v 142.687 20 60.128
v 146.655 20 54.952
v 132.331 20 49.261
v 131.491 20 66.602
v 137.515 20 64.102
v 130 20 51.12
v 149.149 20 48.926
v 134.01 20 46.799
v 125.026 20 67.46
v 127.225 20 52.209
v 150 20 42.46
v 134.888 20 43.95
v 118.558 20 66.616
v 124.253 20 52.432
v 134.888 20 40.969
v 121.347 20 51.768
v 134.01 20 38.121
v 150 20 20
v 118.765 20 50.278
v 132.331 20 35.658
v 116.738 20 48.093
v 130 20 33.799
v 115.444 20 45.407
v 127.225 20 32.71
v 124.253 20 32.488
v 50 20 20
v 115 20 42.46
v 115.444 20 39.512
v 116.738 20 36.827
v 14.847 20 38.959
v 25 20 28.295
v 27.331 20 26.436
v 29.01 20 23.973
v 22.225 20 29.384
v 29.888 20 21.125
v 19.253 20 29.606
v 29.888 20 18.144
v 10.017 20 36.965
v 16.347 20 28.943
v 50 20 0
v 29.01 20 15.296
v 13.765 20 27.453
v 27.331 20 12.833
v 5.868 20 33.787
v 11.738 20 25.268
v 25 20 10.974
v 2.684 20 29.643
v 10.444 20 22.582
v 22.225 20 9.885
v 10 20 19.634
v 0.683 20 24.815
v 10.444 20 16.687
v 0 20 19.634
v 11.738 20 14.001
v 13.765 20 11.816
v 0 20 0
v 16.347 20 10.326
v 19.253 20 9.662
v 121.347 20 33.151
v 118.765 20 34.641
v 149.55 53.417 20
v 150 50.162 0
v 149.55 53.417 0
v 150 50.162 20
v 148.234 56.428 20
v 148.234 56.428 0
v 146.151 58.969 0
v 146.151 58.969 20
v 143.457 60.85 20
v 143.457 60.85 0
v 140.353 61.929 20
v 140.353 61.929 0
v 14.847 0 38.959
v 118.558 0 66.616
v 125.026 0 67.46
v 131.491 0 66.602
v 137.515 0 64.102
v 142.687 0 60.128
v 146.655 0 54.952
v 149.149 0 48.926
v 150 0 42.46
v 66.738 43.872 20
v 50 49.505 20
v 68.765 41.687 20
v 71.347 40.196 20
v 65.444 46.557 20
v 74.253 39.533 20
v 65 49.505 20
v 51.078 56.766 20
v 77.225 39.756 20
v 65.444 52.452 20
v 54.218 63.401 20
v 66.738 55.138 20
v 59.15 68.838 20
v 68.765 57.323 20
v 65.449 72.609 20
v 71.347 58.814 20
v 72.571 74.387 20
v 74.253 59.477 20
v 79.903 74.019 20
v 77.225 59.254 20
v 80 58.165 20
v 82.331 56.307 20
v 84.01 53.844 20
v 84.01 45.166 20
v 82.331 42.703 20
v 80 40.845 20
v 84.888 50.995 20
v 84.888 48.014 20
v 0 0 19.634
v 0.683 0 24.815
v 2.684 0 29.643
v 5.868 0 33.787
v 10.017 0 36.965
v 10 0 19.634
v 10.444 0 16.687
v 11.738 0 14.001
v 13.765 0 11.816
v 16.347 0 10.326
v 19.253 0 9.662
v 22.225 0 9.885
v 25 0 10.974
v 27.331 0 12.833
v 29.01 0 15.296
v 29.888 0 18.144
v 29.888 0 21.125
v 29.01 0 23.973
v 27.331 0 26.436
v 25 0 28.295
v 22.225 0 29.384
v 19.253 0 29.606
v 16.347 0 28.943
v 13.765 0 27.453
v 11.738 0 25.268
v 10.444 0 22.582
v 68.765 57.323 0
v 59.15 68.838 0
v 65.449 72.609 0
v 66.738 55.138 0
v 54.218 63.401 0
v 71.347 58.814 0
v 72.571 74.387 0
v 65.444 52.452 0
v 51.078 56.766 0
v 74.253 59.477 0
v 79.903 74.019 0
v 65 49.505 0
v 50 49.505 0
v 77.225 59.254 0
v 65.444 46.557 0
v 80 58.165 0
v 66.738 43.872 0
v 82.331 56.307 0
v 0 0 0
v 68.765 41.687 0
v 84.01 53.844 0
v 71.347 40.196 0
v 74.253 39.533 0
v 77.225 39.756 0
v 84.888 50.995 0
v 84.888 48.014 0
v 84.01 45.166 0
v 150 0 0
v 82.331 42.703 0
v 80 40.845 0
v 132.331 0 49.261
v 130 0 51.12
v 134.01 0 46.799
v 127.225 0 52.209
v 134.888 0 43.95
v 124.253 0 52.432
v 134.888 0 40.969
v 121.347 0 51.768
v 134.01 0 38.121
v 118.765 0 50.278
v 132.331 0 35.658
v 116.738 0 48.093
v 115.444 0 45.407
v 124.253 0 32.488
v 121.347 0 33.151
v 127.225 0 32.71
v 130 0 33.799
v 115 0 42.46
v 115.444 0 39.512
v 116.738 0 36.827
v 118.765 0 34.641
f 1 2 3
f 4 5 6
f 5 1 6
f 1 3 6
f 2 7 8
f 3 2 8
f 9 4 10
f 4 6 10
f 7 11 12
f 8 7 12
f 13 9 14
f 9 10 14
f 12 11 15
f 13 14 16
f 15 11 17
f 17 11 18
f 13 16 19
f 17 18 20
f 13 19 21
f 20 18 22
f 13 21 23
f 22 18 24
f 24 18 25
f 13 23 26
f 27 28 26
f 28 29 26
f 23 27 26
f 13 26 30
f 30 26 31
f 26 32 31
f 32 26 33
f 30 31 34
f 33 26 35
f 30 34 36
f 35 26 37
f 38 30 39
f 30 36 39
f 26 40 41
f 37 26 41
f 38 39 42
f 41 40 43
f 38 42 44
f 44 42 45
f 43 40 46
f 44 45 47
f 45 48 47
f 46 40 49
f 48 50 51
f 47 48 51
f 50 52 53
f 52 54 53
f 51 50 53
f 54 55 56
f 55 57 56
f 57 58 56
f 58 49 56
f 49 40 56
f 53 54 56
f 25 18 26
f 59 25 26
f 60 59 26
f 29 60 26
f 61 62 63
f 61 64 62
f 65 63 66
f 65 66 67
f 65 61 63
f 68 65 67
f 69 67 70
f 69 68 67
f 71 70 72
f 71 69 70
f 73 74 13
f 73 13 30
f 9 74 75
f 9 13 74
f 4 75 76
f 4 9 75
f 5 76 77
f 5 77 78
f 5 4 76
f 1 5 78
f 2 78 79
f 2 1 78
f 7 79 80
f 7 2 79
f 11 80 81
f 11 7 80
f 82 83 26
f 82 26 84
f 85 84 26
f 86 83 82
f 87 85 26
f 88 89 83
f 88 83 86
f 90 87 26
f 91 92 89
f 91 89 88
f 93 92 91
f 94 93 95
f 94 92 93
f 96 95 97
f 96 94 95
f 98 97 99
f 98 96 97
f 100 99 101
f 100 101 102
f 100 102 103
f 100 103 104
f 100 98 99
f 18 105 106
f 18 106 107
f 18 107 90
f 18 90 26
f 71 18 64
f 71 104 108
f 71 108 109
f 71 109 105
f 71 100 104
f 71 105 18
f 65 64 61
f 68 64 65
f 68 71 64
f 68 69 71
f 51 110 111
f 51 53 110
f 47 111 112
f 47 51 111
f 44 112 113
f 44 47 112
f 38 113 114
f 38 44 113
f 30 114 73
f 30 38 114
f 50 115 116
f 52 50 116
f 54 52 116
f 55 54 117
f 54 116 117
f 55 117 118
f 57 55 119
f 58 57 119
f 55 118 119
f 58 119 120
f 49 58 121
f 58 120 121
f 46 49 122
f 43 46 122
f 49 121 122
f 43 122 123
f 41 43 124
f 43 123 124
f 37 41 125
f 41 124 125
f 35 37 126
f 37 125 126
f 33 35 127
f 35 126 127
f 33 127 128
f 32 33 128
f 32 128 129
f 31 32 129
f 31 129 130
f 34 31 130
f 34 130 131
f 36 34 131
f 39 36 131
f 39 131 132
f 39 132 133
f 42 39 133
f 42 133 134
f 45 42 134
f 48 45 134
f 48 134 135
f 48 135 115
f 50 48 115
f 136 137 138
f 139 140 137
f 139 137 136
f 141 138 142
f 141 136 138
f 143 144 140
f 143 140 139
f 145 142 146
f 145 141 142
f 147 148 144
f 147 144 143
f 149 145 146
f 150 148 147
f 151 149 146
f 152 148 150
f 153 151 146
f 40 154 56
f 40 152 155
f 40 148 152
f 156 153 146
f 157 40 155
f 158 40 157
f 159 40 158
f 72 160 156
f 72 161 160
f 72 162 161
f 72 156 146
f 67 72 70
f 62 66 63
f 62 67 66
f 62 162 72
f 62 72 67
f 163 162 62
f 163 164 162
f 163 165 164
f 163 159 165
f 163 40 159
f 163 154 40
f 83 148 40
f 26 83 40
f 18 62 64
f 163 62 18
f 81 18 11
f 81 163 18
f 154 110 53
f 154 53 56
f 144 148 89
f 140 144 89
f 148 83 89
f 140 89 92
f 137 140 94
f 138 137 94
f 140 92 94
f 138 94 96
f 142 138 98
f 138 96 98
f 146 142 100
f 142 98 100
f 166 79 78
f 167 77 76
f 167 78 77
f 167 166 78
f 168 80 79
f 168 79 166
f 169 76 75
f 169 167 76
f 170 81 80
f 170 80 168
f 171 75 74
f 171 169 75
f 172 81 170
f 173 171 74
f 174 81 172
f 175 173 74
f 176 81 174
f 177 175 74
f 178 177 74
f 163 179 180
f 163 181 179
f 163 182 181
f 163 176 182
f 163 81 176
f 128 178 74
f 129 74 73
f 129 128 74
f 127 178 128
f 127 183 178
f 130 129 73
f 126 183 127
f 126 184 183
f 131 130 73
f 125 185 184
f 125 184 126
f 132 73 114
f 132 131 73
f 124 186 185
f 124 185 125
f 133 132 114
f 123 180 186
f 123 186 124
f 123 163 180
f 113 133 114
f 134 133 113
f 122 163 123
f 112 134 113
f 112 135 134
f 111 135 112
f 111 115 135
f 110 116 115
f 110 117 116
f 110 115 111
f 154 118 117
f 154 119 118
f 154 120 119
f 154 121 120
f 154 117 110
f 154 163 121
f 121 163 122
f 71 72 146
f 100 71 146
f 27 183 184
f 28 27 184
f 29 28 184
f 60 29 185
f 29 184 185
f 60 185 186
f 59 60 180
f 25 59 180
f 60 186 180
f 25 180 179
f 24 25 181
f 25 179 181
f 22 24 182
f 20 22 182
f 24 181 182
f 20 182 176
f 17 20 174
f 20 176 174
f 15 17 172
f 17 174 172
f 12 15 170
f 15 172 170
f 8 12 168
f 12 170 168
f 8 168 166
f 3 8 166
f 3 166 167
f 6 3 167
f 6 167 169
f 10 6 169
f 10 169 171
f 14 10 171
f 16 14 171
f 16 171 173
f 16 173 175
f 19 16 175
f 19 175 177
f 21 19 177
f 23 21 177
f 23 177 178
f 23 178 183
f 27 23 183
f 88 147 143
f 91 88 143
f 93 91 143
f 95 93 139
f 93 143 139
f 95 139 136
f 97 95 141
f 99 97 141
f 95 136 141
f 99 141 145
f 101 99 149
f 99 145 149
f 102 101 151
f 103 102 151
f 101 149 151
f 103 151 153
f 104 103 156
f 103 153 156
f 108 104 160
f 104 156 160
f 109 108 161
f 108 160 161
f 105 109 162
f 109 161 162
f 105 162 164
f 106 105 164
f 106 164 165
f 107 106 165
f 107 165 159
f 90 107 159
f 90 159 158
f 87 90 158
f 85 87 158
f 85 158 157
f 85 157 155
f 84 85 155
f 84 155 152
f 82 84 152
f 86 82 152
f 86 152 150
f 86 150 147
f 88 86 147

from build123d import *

# Parameters (mm, degrees)
EXTRUDE_1_DEPTH         = 20
EXTRUDE_2_DEPTH         = 20
FILLET_1_R              = 12
FILLET_2_R              = 20
FILLET_3_R              = 25
HOLE_WIZARD_20_0_20_1_D = 20
HOLE_WIZARD_20_0_20_2_D = 20


with BuildPart() as part:
    # 草圖1 → 填料-伸長1 (new body)
    with BuildSketch(Plane(origin=(0, 0, 0), x_dir=(1, 0, 0), z_dir=(0, 1, 0))):
        Polygon((0, 0), (150, 0), (150, -75), (0, -35), align=None)
    extrude(amount=EXTRUDE_1_DEPTH)

    # 草圖2 → 填料-伸長2 (add)
    with BuildSketch(Plane(origin=(0, 0, 0), x_dir=(-1, 0, 0), z_dir=(0, 0, -1))):
        Polygon((-150, 0), (-150, 60), (-50, 80), (-50, 0), align=None)
    extrude(amount=-EXTRUDE_2_DEPTH)

    # 圓角1
    fillet_1_edges = [part.edges().sort_by_distance(p)[0] for p in [
        (150, 60, 10),
    ]]
    fillet(fillet_1_edges, radius=FILLET_1_R)

    # 圓角2
    fillet_2_edges = [part.edges().sort_by_distance(p)[0] for p in [
        (0, 10, 35),
    ]]
    fillet(fillet_2_edges, radius=FILLET_2_R)

    # 圓角3
    fillet_3_edges = [part.edges().sort_by_distance(p)[0] for p in [
        (50, 80, 10),
        (150, 10, 75),
    ]]
    fillet(fillet_3_edges, radius=FILLET_3_R)

    # Ø20.0 (20) 直徑孔1 (through all)
    with Locations(Plane(origin=(0, 20, 0), x_dir=(1, 0, 0), z_dir=(0, 1, 0))):
        with Locations((125, -42.45970884), (20, -19.634433738)):
            Hole(HOLE_WIZARD_20_0_20_1_D / 2)

    # Ø20.0 (20) 直徑孔2 (through all)
    with Locations(Plane.XY.offset(20)):
        with Locations((75, 49.504902432)):
            Hole(HOLE_WIZARD_20_0_20_2_D / 2)


solid = part.part
